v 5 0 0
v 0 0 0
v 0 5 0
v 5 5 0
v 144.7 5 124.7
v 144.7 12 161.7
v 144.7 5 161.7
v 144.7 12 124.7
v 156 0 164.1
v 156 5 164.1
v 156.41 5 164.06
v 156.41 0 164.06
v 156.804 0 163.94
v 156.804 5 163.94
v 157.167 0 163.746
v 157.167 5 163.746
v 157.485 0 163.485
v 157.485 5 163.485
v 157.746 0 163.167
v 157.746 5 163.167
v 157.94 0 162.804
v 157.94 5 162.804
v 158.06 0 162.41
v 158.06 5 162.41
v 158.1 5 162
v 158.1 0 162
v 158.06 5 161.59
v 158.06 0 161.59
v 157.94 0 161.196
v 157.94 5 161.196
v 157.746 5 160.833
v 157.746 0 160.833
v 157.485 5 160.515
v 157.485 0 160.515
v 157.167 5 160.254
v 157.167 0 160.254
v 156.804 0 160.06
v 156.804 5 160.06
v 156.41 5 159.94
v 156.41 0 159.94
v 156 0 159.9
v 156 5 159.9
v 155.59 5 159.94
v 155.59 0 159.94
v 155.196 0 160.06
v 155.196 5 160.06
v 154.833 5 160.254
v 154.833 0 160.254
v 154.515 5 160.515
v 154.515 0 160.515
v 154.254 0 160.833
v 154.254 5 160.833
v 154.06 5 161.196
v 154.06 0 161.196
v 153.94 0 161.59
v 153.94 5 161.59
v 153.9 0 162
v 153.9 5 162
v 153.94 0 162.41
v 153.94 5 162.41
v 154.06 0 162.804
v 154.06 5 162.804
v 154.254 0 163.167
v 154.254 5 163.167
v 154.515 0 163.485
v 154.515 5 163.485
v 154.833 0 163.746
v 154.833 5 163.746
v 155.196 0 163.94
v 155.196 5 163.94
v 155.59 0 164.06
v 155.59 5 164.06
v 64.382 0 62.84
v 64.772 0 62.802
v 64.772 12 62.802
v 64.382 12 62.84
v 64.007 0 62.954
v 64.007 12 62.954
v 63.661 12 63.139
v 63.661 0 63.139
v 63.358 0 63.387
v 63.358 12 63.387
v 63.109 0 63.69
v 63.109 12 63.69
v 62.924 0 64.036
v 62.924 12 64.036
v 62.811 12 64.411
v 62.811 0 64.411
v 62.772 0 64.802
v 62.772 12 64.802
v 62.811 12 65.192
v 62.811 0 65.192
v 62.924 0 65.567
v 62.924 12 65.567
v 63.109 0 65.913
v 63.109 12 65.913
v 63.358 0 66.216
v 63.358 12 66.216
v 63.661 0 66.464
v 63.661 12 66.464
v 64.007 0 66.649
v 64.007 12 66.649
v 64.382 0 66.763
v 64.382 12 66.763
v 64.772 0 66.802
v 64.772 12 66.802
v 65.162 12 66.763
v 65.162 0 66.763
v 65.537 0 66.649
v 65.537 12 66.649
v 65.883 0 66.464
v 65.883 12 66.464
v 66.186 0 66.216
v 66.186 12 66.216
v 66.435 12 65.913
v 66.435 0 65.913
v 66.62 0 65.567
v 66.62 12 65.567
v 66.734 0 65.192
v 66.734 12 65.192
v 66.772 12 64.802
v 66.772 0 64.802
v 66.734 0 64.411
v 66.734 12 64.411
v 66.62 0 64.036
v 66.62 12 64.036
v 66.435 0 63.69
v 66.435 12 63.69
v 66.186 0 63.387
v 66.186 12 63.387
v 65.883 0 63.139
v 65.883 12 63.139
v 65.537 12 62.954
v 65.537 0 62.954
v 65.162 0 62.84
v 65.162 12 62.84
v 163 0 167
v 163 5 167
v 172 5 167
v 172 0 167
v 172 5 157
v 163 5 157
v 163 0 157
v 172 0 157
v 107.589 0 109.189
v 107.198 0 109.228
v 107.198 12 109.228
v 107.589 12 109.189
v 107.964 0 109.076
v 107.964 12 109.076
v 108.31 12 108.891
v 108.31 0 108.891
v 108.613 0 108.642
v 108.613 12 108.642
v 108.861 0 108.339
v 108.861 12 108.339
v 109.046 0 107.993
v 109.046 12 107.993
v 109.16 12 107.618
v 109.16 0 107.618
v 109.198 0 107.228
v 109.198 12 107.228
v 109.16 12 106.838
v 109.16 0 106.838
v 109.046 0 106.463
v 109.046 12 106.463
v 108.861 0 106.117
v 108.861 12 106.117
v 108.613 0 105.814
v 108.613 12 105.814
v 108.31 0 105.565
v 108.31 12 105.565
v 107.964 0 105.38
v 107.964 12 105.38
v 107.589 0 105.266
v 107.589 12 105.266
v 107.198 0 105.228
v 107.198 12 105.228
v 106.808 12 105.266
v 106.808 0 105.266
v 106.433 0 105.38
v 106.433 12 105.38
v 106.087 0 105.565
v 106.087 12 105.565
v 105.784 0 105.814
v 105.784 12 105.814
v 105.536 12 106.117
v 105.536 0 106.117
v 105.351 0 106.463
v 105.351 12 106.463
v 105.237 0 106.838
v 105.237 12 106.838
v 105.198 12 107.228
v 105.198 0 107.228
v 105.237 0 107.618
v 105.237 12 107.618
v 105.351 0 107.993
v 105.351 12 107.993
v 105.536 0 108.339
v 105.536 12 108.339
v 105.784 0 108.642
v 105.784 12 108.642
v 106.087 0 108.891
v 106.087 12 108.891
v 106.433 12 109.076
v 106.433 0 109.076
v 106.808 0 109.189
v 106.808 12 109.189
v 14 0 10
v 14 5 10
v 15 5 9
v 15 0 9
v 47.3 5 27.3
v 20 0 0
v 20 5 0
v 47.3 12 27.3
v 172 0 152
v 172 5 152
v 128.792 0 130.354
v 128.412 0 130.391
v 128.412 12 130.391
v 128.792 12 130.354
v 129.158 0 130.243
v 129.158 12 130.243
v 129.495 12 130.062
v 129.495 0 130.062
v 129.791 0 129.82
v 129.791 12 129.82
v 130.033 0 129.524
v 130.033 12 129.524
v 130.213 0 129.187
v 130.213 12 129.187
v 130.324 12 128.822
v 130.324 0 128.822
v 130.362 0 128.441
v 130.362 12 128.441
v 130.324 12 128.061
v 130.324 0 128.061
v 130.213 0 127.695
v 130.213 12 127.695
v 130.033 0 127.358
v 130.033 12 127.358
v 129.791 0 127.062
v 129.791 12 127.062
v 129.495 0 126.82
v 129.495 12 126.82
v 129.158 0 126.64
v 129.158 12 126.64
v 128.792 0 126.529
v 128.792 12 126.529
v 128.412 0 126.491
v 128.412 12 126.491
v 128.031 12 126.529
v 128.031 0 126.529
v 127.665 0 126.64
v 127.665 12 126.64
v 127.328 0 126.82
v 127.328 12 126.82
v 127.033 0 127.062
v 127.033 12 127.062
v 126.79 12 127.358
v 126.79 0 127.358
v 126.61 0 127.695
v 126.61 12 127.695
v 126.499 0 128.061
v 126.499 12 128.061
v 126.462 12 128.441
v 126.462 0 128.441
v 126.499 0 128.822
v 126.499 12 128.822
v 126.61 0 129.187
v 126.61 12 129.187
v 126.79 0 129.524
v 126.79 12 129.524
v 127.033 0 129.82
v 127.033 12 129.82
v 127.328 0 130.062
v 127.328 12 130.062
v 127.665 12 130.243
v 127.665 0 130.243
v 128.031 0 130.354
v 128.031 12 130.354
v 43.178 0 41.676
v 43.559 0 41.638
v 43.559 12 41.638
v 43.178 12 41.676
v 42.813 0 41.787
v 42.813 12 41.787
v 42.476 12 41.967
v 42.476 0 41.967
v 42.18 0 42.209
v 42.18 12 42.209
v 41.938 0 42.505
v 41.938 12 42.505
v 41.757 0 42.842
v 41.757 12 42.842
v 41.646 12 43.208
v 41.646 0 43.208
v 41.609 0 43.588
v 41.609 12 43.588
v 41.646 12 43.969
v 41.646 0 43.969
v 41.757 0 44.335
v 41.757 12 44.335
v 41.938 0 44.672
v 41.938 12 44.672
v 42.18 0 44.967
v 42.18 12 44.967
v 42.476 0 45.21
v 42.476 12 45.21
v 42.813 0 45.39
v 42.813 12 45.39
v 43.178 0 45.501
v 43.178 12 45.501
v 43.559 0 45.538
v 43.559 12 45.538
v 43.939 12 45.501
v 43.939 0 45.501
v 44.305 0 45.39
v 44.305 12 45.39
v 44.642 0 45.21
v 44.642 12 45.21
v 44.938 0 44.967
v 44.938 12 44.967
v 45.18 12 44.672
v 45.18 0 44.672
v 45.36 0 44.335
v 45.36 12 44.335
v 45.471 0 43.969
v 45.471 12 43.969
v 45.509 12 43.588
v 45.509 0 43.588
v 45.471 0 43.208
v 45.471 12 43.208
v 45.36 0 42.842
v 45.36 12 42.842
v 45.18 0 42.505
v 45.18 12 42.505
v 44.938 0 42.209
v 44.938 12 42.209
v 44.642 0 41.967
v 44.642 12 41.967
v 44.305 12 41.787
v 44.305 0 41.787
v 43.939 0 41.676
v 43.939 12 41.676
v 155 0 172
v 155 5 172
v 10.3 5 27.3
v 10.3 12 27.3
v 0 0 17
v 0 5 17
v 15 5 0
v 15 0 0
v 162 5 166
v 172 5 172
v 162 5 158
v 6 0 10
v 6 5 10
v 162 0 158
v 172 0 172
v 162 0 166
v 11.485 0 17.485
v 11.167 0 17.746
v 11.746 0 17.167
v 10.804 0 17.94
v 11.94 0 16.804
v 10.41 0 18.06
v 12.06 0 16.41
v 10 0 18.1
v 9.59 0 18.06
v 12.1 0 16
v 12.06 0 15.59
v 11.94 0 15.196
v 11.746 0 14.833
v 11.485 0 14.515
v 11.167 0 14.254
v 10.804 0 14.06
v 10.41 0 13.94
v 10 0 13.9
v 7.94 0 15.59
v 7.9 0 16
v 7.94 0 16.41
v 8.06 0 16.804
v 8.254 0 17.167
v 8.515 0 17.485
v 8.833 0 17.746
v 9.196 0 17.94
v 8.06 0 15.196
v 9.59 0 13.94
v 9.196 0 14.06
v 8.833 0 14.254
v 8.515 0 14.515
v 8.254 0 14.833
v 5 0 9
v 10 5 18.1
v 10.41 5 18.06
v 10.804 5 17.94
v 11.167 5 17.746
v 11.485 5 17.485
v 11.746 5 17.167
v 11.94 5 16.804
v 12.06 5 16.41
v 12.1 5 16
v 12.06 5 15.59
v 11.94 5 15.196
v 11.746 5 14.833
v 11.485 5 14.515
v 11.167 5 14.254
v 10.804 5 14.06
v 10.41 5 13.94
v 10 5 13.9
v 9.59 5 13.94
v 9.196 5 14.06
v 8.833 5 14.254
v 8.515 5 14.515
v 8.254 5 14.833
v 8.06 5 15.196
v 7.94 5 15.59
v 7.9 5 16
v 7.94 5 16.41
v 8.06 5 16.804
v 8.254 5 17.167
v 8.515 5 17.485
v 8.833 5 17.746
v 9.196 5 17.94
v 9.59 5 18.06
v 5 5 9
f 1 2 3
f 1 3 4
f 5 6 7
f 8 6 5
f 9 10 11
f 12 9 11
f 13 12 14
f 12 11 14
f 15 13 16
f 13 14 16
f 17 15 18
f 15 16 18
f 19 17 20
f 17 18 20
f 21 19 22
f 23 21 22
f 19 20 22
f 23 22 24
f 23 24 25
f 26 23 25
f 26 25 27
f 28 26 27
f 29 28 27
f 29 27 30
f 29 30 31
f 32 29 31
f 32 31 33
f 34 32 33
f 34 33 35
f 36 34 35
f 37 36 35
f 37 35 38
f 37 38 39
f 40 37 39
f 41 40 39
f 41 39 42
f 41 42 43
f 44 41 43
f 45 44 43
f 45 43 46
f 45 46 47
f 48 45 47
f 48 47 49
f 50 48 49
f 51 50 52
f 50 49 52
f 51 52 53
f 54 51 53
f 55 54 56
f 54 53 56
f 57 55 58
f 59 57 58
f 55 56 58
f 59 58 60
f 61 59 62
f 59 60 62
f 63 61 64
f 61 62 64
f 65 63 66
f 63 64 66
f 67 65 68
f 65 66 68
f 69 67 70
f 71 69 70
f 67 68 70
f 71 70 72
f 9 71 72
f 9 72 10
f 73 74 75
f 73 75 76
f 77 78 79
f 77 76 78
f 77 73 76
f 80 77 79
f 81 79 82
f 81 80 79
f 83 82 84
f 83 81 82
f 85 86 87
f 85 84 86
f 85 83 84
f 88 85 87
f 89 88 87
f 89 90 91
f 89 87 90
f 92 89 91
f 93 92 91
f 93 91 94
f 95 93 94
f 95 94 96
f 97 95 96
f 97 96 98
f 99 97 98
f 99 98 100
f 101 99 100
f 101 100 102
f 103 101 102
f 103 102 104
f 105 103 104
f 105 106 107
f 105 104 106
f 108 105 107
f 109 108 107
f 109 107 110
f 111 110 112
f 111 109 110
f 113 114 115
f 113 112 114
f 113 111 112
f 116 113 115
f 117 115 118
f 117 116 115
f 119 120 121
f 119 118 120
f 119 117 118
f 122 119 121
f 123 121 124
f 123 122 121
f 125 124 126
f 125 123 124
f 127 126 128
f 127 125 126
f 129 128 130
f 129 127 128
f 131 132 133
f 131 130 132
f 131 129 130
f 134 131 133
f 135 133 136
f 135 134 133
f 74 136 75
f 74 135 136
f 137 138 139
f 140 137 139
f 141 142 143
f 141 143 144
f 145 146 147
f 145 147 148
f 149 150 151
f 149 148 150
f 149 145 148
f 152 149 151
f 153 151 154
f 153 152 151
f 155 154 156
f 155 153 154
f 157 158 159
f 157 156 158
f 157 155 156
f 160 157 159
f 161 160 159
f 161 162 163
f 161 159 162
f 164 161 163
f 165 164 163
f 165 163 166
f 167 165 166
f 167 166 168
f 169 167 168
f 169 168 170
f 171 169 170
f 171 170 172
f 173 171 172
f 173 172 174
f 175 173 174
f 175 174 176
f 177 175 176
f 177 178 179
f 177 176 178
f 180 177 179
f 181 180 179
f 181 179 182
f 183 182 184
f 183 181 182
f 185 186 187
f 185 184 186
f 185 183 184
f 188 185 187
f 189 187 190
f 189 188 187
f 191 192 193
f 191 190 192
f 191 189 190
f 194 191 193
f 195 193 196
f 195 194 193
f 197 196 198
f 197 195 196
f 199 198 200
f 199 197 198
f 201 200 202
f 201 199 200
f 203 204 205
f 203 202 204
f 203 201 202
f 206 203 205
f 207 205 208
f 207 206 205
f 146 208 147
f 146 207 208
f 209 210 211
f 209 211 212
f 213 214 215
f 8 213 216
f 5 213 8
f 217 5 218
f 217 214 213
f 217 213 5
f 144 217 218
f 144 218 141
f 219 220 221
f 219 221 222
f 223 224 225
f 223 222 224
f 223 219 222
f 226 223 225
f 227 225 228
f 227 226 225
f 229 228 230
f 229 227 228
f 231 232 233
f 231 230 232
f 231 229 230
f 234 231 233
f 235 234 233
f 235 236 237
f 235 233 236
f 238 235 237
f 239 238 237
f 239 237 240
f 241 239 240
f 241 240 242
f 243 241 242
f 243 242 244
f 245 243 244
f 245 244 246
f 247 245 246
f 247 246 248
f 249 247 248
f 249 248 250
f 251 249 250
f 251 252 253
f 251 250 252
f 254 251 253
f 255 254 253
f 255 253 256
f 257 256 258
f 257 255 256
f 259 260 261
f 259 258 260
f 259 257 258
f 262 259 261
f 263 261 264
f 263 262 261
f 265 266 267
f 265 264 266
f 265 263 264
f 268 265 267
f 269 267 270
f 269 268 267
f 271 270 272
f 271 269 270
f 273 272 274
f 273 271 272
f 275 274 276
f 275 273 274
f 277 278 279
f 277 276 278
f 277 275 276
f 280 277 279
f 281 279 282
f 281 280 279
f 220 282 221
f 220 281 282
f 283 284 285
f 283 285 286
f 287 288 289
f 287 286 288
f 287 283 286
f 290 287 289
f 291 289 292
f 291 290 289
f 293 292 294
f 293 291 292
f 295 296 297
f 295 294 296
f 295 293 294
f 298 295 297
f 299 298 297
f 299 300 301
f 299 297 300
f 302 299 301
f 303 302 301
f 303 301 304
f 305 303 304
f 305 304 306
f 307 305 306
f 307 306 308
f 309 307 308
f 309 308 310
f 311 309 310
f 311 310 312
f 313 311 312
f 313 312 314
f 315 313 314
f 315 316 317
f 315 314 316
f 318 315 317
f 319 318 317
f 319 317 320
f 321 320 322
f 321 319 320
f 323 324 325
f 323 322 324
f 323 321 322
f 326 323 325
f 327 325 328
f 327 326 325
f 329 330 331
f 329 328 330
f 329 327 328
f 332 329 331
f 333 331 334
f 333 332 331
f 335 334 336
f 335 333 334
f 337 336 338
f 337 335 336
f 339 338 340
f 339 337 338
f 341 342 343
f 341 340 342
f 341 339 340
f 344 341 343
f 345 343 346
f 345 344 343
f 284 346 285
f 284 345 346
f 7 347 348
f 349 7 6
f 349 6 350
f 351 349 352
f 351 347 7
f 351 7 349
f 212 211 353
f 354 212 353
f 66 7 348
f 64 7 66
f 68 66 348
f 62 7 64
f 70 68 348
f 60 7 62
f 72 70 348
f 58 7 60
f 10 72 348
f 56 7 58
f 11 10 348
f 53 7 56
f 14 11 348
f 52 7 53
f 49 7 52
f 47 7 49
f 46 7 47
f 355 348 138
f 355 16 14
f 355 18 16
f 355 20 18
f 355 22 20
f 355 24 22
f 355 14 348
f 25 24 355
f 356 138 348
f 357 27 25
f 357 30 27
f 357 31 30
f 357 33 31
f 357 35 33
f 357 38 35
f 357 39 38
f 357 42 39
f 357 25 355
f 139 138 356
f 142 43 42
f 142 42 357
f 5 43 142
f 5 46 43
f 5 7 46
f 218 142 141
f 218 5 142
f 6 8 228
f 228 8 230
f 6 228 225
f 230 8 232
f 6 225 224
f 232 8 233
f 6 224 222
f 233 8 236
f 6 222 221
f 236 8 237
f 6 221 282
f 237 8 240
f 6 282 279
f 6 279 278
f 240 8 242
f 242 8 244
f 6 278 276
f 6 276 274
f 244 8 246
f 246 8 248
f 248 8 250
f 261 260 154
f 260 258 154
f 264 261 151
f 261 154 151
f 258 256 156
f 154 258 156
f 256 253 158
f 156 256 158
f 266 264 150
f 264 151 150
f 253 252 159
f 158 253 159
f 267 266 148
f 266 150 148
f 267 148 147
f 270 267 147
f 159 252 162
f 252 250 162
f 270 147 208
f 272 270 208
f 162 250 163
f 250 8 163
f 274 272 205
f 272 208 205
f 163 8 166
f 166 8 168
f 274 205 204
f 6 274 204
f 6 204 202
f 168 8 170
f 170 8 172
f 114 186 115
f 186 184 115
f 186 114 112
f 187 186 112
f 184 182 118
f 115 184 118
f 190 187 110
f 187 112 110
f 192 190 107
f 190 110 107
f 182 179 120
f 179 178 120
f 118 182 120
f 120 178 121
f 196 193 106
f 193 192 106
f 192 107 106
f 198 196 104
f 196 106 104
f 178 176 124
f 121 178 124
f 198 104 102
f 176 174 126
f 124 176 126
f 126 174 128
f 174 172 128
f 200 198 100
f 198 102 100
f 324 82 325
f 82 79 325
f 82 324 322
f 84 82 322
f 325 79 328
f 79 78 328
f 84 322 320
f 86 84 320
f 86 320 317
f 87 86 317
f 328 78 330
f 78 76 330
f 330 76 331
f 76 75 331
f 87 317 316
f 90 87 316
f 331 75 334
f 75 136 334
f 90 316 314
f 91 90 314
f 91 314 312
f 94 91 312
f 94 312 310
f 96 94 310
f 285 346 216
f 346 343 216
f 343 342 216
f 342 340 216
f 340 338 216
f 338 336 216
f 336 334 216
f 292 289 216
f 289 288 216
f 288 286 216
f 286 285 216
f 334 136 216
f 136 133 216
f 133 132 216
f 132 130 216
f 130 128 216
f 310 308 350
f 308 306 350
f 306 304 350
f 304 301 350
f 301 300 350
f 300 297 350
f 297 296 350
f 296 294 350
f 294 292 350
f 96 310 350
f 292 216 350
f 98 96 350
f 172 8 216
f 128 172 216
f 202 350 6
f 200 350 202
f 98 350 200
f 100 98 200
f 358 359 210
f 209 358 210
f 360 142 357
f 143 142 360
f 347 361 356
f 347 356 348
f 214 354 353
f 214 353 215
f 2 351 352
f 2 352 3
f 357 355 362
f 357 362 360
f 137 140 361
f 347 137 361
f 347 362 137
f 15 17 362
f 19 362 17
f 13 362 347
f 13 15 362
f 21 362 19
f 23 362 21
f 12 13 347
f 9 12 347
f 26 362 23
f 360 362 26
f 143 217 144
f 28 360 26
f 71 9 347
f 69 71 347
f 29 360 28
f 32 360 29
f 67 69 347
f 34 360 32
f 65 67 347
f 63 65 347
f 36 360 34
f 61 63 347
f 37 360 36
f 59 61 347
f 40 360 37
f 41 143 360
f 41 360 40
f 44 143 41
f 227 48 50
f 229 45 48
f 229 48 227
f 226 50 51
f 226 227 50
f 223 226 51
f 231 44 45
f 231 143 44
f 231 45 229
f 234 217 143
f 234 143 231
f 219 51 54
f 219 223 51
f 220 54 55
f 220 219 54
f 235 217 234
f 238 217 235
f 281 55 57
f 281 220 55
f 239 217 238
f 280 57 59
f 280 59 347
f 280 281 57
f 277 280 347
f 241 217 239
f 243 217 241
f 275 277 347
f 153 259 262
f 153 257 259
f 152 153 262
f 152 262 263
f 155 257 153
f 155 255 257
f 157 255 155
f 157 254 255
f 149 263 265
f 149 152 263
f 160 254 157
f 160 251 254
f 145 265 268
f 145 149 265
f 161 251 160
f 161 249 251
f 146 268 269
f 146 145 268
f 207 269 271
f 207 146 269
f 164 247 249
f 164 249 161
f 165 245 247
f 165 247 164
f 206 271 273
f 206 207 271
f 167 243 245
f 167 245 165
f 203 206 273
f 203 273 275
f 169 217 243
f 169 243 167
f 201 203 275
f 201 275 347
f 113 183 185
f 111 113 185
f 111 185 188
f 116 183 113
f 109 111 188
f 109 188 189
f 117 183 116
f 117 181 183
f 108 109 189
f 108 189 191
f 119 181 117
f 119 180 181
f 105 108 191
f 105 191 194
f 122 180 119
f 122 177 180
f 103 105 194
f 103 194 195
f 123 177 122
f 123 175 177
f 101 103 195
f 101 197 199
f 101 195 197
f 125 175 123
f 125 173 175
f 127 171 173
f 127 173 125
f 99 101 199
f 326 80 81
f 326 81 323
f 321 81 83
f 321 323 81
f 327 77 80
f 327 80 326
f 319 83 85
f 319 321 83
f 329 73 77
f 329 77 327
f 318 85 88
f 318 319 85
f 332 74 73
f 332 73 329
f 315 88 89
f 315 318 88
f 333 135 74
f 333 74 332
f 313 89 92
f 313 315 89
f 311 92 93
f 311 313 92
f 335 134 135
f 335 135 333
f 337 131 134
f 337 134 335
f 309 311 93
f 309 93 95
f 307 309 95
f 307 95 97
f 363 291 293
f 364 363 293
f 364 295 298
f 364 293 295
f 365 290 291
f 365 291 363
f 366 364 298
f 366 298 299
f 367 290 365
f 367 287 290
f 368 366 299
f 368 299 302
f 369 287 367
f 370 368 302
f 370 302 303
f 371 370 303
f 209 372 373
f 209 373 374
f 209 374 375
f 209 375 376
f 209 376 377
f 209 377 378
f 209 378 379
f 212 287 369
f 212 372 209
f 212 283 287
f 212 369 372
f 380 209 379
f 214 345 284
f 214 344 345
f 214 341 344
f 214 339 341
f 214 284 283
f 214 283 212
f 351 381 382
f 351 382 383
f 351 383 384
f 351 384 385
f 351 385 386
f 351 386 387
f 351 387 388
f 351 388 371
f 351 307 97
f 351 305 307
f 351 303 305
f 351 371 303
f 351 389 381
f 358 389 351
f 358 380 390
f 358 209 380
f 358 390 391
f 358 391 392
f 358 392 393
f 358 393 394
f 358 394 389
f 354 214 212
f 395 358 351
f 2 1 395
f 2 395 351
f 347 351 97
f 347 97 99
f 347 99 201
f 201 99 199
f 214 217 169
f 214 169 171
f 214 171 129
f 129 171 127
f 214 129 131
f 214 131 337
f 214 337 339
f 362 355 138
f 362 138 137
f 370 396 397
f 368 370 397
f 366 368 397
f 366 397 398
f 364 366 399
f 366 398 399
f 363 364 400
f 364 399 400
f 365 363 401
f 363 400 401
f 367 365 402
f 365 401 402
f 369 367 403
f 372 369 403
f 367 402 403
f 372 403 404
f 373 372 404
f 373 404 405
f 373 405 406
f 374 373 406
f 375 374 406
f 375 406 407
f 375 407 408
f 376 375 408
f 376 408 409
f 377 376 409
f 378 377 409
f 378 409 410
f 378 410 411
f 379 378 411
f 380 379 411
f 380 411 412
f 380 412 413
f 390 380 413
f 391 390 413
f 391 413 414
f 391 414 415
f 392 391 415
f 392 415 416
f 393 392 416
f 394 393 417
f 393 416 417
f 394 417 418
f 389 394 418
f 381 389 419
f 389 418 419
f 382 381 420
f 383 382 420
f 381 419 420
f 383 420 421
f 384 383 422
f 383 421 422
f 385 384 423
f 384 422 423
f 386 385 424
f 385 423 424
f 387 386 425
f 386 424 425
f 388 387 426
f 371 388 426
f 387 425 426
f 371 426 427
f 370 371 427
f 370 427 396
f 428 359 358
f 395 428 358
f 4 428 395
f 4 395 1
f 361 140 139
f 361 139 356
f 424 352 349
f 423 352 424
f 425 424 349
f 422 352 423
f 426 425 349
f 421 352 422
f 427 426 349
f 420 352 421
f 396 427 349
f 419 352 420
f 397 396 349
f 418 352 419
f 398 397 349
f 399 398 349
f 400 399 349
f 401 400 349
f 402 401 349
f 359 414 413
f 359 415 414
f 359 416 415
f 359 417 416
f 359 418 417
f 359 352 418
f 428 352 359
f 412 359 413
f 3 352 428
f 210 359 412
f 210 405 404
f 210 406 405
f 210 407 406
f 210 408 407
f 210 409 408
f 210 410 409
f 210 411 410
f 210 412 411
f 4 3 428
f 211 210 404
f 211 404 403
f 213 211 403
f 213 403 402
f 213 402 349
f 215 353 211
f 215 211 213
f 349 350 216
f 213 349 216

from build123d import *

# Parameters (mm, degrees)
MAIN_BASE_EXTRUDE_DEPTH       = 12
SKETCH3_W                     = 47.3
SKETCH3_H                     = 27.3
SKETCH3_W_2                   = 27.3
SKETCH3_H_2                   = 47.3
TRACK_SEAT_CUT_DEPTH          = 7
SKETCH2_R                     = 2.1
TRACK_CONNECT_HOLES_DEPTH     = 244.540551038
WALL_SPACED_HOLES_DEPTH       = 244.540551038
WALL_SPACED_HOLES_DEPTH_BACK  = 244.540551038
SKETCH5_R                     = 1.95
SKETCH5_R_2                   = 2
SKETCH9_W                     = 10
SKETCH9_H                     = 10
WIRE_PASSTHROUGH_CUT_DEPTH    = 244.345433489
WIRE_PASSTHROUGH_CHAMFER_SIZE = 1


with BuildPart() as part:
    # Sketch1 → Main Base Extrude (new body)
    with BuildSketch(Plane(origin=(0, 0, 0), x_dir=(1, 0, 0), z_dir=(0, 1, 0))):
        Polygon((0, 0), (20, 0), (172, -152), (172, -172), (155, -172), (0, -17), align=None)
    extrude(amount=MAIN_BASE_EXTRUDE_DEPTH)

    # Sketch3 → Track Seat Cut (cut)
    with BuildSketch(Plane(origin=(0, 12, 0), x_dir=(1, 0, 0), z_dir=(0, 1, 0))):
        with Locations((23.65, -13.65)):
            Rectangle(SKETCH3_W, SKETCH3_H)
        with Locations((158.35, -148.35)):
            Rectangle(SKETCH3_W_2, SKETCH3_H_2)
    extrude(amount=-TRACK_SEAT_CUT_DEPTH, mode=Mode.SUBTRACT)

    # Sketch2 → Track Connect Holes (cut, through all)
    with BuildSketch(Plane(origin=(0, 12, 0), x_dir=(1, 0, 0), z_dir=(0, 1, 0))):
        with Locations(Location((10, -16, 0), (0, 0, 270))):
            Circle(SKETCH2_R)
        with Locations(Location((156, -162, 0), (0, 0, 270))):
            Circle(SKETCH2_R)
    extrude(amount=-TRACK_CONNECT_HOLES_DEPTH, mode=Mode.SUBTRACT)

    # Sketch5 → Wall Spaced Holes (cut, two sides: drawn at the far end of the back side and taken through both)
    with BuildSketch(Plane(origin=(0, 0, 0), x_dir=(1, 0, 0), z_dir=(0, 1, 0)).offset(-WALL_SPACED_HOLES_DEPTH_BACK)):
        with Locations(Location((128.411688245, -128.441125497, 0), (0, 0, 270))):
            Circle(SKETCH5_R)
        with Locations(Location((107.19848481, -107.227922061, 0), (0, 0, 270))):
            Circle(SKETCH5_R_2)
        with Locations(Location((43.558874503, -43.588311755, 0), (0, 0, 90))):
            Circle(SKETCH5_R)
        with Locations(Location((64.772077939, -64.80151519, 0), (0, 0, 90))):
            Circle(SKETCH5_R_2)
    extrude(amount=WALL_SPACED_HOLES_DEPTH + WALL_SPACED_HOLES_DEPTH_BACK, mode=Mode.SUBTRACT)

    # Sketch9 → Wire Passthrough Cut (cut, through all)
    with BuildSketch(Plane(origin=(0, 5, 0), x_dir=(1, 0, 0), z_dir=(0, 1, 0))):
        with Locations((10, -5)):
            Rectangle(SKETCH9_W, SKETCH9_H)
        with Locations((167, -162)):
            Rectangle(SKETCH9_W, SKETCH9_H)
    extrude(amount=-WIRE_PASSTHROUGH_CUT_DEPTH, mode=Mode.SUBTRACT)

    # Wire Passthrough Chamfer
    wire_passthrough_chamfer_edges = [part.edges().sort_by_distance(p)[0] for p in [
        (5, 2.5, 10),
        (15, 2.5, 10),
        (162, 2.5, 167),
        (162, 2.5, 157),
    ]]
    chamfer(wire_passthrough_chamfer_edges, length=WIRE_PASSTHROUGH_CHAMFER_SIZE)


solid = part.part
